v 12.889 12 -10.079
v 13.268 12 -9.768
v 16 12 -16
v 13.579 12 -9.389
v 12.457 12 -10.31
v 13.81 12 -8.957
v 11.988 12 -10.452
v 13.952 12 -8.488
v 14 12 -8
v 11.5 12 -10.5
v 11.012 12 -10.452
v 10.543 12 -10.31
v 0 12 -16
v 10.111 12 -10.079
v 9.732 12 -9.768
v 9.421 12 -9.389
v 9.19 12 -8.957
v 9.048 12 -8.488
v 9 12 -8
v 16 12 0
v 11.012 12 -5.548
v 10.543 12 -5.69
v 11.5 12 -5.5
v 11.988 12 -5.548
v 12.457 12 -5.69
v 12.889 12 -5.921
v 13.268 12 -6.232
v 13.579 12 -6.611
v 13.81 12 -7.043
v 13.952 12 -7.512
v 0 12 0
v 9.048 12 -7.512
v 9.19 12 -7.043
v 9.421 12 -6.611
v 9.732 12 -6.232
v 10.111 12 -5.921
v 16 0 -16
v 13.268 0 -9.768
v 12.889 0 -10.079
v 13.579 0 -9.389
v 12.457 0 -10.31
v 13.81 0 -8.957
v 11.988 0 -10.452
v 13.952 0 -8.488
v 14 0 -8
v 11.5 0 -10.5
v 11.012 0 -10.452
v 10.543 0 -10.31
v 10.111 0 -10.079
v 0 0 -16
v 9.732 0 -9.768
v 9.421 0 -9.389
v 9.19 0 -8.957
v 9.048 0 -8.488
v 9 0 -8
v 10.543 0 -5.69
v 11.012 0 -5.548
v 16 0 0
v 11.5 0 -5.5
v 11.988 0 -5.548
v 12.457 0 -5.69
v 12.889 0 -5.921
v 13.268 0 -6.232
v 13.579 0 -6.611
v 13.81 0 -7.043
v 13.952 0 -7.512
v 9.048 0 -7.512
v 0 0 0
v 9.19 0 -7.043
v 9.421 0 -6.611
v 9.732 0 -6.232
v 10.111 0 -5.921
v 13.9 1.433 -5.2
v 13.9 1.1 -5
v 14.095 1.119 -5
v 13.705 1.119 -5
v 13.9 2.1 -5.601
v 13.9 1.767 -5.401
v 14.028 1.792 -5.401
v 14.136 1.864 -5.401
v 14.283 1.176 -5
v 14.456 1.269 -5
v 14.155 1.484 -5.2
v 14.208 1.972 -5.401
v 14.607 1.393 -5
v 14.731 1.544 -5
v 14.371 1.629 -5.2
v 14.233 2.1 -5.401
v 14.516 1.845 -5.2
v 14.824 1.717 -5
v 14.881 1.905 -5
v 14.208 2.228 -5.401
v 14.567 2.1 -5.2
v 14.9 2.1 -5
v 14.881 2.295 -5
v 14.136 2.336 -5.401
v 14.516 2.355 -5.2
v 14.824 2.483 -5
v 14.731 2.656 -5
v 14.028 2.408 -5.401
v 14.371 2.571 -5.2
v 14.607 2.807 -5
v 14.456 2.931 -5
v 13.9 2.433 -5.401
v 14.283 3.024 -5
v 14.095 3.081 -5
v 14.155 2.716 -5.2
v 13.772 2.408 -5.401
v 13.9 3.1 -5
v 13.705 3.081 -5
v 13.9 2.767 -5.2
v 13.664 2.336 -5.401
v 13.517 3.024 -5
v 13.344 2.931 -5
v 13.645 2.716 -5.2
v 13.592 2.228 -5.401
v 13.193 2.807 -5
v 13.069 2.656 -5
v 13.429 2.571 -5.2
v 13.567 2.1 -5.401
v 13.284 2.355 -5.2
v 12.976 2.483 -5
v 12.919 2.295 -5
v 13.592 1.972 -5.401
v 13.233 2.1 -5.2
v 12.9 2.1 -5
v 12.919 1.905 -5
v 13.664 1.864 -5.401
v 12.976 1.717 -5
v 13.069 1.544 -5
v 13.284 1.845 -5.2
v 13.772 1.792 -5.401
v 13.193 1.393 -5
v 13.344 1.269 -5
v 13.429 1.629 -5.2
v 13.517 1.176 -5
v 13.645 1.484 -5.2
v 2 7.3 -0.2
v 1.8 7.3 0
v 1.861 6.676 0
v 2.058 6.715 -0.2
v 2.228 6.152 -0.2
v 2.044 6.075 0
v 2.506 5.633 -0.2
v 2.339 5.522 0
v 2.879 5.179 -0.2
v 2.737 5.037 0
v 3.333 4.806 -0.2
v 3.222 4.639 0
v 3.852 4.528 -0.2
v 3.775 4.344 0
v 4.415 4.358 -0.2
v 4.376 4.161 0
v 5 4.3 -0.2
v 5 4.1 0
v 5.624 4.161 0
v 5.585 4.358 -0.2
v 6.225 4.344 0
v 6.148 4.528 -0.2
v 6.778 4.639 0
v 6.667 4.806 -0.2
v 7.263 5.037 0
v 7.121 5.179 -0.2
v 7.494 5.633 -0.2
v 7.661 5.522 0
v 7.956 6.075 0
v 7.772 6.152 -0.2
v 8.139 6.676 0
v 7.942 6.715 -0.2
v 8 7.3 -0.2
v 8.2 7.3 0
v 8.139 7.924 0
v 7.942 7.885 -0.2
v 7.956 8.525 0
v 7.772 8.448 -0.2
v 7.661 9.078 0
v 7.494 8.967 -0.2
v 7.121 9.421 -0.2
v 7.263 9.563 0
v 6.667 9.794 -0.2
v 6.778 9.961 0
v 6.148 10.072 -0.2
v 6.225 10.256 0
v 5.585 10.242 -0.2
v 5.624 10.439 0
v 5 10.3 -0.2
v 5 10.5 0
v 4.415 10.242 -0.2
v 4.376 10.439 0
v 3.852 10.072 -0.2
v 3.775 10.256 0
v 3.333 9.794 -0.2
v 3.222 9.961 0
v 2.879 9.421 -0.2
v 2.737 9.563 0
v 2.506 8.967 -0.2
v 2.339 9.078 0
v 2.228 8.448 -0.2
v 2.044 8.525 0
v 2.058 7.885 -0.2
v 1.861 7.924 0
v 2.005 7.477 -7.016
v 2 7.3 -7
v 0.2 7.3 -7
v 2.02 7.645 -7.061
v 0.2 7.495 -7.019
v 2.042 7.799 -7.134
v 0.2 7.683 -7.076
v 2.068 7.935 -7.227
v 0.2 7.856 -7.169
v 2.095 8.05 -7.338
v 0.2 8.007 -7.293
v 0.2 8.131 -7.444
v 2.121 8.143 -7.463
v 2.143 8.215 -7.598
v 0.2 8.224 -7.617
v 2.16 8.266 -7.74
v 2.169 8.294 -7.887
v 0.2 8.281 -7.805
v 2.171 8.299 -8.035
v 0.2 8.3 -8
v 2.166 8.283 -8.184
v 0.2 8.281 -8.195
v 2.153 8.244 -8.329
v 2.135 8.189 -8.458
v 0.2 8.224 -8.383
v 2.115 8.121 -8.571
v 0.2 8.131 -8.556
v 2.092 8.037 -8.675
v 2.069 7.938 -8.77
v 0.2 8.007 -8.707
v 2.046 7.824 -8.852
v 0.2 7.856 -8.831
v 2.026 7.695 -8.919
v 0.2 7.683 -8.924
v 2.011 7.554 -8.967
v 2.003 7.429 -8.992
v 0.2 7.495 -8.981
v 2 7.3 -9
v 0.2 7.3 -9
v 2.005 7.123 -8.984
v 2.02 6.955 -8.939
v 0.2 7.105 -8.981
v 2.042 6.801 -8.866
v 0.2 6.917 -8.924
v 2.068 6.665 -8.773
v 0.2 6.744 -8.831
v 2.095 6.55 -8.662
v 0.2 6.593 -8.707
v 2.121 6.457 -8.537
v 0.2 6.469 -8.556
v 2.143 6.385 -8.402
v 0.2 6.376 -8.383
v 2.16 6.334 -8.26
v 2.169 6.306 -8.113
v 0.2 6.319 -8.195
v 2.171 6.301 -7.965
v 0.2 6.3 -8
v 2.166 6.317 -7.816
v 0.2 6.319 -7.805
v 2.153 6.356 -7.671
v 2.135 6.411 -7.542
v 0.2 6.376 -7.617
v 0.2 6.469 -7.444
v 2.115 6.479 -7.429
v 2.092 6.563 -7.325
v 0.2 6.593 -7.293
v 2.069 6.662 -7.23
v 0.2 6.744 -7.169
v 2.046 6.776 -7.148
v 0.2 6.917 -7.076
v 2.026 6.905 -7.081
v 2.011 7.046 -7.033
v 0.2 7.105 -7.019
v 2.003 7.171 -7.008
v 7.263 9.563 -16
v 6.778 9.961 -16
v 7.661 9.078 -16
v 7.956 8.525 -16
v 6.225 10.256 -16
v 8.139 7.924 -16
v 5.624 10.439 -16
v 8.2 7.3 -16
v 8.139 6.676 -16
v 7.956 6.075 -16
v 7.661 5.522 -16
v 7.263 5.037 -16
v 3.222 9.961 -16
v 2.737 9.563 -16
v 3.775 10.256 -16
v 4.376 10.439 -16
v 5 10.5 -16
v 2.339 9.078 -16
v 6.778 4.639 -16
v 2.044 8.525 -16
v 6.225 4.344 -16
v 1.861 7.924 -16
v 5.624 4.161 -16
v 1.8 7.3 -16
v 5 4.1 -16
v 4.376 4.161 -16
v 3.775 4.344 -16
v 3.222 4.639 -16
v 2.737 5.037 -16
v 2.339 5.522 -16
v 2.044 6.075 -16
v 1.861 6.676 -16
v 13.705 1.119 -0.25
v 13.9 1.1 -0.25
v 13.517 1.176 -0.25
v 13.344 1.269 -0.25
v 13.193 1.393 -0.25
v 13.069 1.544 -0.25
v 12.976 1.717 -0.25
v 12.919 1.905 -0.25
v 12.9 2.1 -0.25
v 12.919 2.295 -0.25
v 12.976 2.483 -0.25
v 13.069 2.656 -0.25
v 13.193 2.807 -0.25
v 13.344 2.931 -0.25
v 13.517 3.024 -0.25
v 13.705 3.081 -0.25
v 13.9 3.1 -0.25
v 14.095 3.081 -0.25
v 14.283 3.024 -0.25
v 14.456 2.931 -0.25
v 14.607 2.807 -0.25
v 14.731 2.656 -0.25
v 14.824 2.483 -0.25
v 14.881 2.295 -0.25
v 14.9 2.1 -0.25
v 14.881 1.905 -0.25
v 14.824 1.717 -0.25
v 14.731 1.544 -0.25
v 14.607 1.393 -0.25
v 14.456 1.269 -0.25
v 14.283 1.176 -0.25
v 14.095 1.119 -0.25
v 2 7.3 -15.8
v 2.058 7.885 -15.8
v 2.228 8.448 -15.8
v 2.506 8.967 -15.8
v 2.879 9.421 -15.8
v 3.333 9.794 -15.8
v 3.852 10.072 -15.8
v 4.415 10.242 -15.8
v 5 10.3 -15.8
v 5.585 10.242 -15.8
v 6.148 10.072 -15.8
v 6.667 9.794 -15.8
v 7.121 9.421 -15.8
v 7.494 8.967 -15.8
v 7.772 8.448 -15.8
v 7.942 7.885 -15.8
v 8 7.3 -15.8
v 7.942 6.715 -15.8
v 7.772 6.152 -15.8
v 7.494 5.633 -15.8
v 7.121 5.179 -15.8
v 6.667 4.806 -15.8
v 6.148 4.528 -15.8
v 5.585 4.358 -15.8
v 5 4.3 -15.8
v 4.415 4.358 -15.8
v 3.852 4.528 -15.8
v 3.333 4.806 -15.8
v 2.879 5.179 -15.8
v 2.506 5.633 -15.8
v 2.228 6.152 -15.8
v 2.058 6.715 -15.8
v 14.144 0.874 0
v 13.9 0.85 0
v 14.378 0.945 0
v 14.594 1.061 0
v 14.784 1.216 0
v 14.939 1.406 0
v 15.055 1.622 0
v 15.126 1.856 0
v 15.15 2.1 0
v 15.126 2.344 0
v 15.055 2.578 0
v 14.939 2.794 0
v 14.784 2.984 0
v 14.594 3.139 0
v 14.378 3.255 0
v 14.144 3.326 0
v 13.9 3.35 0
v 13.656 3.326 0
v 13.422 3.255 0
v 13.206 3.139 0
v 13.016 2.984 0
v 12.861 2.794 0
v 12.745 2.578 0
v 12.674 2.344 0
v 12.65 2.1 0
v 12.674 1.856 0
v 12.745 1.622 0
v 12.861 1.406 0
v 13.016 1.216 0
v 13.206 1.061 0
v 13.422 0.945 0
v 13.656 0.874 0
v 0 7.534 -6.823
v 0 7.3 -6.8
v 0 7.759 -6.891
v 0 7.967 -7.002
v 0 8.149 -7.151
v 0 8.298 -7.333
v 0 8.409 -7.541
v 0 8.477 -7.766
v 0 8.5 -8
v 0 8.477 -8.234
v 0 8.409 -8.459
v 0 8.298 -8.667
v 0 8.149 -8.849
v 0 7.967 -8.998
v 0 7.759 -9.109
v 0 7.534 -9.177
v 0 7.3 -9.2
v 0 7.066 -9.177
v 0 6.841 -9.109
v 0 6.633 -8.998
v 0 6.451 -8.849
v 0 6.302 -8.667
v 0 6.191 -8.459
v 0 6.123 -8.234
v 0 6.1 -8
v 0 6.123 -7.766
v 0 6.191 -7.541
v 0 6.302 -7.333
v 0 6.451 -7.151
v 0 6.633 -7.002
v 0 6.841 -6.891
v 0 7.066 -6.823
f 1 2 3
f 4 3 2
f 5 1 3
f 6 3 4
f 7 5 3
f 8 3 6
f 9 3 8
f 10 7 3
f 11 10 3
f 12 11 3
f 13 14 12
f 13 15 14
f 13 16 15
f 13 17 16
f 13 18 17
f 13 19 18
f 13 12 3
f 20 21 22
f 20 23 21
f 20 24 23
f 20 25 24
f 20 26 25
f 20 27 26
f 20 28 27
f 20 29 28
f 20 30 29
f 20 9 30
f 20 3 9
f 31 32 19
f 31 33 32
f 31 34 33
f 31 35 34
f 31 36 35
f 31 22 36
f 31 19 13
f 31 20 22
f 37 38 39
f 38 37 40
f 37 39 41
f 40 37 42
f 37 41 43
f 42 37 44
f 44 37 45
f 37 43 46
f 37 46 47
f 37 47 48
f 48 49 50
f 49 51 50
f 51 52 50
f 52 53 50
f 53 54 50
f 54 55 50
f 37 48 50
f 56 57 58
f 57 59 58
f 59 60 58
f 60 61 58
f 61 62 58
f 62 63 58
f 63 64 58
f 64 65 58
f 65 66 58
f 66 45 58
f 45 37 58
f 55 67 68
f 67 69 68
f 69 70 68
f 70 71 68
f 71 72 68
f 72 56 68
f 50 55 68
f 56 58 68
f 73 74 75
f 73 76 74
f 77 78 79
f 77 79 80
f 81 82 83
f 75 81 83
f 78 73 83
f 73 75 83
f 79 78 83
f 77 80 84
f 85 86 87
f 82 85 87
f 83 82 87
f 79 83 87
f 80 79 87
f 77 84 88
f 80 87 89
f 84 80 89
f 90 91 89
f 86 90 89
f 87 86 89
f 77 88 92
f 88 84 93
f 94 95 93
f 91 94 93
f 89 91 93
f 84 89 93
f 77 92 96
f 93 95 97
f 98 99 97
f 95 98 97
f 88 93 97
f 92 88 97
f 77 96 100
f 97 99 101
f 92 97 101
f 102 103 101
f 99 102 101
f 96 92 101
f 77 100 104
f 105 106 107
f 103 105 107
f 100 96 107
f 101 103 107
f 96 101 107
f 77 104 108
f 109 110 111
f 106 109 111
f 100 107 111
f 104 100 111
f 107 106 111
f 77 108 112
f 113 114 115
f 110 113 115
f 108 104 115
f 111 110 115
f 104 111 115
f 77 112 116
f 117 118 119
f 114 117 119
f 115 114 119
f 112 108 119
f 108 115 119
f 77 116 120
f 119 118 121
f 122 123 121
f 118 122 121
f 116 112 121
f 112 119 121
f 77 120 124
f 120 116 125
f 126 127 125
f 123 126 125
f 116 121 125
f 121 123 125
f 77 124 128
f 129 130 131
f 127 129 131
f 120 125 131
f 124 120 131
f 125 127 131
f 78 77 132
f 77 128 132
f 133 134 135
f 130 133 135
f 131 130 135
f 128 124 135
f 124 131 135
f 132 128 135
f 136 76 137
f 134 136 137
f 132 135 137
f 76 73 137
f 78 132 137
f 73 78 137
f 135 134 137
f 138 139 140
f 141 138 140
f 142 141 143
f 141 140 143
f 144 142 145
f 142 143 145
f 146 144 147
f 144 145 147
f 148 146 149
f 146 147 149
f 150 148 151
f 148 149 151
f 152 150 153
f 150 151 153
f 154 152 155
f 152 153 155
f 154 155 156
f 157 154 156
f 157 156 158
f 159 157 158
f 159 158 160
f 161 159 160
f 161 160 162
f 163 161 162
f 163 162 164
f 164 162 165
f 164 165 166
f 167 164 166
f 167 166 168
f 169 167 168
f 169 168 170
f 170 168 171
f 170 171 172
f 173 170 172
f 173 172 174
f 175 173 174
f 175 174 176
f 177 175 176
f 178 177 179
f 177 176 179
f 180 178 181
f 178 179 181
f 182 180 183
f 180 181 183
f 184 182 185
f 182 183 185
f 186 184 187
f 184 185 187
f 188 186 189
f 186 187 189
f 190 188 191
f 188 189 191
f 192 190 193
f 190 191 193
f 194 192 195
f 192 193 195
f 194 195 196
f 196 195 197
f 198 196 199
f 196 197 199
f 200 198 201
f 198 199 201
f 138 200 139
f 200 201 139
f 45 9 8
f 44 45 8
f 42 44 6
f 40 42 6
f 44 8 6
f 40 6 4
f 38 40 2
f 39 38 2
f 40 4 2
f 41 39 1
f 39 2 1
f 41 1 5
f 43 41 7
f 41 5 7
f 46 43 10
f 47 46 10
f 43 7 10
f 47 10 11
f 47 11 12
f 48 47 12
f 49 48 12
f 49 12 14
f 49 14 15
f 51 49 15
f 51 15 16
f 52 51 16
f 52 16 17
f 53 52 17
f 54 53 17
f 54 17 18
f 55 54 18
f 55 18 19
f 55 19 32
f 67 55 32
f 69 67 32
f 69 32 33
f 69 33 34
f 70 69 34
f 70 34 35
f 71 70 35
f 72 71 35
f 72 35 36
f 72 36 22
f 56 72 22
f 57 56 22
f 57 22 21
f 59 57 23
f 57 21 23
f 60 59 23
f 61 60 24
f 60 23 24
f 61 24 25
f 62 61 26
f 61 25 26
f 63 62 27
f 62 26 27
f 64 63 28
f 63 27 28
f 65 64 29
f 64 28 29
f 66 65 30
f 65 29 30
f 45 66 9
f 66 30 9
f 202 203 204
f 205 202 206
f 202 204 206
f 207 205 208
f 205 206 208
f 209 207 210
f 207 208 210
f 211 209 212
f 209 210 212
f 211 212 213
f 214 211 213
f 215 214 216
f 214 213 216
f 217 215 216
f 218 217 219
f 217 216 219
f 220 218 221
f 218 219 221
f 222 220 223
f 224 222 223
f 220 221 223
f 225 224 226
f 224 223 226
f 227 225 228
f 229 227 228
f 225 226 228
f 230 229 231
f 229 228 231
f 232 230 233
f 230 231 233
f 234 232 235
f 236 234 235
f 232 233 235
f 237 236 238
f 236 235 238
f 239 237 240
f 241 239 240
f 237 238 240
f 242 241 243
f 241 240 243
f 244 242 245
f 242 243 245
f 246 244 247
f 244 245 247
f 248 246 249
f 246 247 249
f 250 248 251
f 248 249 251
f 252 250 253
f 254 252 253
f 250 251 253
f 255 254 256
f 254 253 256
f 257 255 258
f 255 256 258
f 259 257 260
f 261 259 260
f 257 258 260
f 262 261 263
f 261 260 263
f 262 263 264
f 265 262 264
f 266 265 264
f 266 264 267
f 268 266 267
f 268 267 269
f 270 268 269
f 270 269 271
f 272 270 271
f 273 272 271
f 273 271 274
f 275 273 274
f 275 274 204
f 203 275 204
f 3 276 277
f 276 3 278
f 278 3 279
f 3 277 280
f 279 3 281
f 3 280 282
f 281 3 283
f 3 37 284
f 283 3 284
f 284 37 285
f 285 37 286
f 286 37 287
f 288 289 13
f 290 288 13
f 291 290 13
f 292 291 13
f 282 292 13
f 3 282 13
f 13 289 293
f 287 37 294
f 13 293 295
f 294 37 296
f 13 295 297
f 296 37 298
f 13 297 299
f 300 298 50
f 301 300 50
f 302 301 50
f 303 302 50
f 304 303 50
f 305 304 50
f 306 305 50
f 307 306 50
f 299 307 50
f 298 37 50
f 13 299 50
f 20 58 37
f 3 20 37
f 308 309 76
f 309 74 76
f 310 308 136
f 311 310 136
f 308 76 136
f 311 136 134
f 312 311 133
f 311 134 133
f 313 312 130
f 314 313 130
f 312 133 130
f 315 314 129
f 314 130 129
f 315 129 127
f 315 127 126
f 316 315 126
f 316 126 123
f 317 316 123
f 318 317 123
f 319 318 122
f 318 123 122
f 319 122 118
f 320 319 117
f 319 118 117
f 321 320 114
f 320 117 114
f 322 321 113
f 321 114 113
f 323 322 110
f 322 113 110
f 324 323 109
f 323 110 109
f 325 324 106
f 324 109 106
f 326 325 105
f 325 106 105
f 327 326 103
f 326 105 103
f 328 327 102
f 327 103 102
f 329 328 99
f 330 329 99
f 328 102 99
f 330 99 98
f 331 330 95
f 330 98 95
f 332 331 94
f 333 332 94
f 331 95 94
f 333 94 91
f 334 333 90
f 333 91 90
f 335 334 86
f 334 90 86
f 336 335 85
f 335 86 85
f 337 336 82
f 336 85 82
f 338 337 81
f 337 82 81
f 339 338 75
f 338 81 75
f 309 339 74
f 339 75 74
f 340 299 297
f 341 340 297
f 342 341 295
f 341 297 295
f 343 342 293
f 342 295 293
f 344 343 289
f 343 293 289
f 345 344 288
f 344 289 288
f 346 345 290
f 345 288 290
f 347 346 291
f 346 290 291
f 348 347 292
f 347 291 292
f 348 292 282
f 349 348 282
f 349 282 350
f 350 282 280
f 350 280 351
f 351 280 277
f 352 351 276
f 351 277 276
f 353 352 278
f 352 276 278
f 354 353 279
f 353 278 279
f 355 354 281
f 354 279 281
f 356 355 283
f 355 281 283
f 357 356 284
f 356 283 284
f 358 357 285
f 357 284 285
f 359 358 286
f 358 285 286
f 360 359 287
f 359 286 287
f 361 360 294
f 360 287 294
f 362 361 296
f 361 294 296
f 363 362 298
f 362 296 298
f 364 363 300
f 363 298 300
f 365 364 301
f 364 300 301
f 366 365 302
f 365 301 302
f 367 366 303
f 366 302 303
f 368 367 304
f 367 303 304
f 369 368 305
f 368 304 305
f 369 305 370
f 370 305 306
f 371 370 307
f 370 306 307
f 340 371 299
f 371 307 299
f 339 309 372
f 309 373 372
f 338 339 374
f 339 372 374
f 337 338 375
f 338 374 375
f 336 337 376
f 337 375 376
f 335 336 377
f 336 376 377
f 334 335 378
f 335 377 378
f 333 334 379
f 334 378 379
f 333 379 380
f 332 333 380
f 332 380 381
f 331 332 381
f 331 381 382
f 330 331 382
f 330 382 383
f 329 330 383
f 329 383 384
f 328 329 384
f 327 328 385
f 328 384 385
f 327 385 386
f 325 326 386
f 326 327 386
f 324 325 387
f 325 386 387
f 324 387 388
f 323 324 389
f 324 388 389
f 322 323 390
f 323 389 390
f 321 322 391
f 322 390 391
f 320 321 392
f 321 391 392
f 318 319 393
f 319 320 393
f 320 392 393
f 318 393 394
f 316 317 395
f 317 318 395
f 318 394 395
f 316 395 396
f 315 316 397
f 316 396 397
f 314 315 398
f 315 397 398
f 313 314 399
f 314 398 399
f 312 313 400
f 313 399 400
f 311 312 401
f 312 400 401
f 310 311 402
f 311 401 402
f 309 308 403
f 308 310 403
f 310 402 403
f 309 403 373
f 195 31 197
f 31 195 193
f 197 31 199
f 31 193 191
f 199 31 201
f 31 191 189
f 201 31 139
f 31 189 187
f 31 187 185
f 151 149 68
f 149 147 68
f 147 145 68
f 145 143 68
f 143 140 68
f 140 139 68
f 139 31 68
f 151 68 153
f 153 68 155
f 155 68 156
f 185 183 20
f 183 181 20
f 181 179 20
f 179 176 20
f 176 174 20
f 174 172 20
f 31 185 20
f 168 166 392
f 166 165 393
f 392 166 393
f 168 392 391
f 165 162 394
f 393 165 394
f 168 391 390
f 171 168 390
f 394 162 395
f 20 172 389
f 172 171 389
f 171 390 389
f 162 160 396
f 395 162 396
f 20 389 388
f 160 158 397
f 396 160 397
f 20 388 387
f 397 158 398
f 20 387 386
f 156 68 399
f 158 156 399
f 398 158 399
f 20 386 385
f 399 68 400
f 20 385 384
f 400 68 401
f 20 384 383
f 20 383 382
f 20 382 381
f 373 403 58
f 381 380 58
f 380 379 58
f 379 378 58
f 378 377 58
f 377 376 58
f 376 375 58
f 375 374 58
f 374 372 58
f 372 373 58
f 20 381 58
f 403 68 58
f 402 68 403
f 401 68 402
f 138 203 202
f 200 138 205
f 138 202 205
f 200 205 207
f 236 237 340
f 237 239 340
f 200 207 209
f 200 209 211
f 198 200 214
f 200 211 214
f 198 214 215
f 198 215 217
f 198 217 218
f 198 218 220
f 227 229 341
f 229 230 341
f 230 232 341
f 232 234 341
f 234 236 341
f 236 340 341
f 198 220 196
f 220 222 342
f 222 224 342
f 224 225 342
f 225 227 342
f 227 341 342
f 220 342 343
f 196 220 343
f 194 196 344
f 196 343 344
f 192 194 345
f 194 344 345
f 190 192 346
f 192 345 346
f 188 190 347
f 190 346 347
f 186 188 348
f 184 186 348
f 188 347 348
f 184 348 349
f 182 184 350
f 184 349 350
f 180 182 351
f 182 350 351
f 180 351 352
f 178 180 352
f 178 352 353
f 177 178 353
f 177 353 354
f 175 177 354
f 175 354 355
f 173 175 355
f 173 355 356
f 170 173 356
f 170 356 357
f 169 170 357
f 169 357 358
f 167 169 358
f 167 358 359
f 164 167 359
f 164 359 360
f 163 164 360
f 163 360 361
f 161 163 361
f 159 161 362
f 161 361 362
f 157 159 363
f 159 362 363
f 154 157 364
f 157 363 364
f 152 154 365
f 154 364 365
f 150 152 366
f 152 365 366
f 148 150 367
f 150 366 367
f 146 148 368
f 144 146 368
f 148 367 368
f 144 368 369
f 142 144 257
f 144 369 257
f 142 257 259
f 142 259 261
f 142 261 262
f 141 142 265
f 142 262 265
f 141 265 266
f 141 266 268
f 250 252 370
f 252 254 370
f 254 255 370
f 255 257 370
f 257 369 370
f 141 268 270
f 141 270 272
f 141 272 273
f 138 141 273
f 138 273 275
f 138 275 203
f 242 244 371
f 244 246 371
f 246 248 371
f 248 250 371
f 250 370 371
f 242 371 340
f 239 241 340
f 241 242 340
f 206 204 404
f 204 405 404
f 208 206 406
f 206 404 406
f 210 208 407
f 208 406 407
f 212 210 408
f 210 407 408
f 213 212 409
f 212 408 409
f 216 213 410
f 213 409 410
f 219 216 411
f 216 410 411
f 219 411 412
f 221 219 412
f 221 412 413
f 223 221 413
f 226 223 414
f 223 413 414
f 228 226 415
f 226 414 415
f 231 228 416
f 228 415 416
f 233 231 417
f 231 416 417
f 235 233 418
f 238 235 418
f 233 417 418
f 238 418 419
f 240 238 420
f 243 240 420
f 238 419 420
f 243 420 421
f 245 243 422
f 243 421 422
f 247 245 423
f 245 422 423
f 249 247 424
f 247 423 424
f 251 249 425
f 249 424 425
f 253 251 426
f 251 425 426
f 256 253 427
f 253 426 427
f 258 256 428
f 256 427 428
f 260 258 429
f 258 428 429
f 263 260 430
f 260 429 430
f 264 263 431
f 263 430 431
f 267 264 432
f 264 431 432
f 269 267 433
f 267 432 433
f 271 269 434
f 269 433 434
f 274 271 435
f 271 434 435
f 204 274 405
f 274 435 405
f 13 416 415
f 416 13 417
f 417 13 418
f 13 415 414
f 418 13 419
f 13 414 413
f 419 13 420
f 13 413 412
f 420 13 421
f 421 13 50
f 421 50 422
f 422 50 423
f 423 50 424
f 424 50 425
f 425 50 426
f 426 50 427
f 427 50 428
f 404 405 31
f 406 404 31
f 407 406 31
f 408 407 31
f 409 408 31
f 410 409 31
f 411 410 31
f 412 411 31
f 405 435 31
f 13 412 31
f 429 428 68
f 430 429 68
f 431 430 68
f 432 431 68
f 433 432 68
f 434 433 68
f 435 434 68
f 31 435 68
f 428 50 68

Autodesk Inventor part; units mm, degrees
ref_plane "YZ Plane" through (0, 0, 0) normal (1, 0, 0) x (0, 1, 0)
ref_plane "XZ Plane" through (0, 0, 0) normal (0, 1, 0) x (-1, 0, 0)
ref_plane "XY Plane" through (0, 0, 0) normal (0, 0, 1) x (1, 0, 0)
sketch "Sketch1" plane through (0, 0, 0) normal (0, 1, 0) x (-1, 0, 0)
  line L0 (0, 0) -> (-16, 0)
  line L1 (-16, 0) -> (-16, -16)
  line L2 (-16, -16) -> (0, -16)
  line L3 (0, -16) -> (0, 0)
  dimension "d0" = 16
extrude "Extrusion1" add sketch "Sketch1" along normal blind 12
sketch "Sketch2" plane through (16, 0, -16) normal (0, 0, -1) x (-1, 0, 0)
  line L0 (16, 0) -> (16, 12) projected
  line L1 (0, 12) -> (16, 12) projected
  circle A0 centre (11, 7.3) radius 3
  dimension "d3" = 6
  dimension "d4" = 5
  dimension "d5" = 4.7
extrude "Extrusion2" cut sketch "Sketch2" against normal through all
sketch "Sketch3" plane through (0, 0, 0) normal (0, 0, 1) x (1, 0, 0)
  line L0 (0, 0) -> (16, 0) projected
  line L1 (16, 0) -> (16, 12) projected
  point P0 (13.9, 2.1)
  dimension "d8" = 2.1
  dimension "d9" = 2.1
hole "Hole1" at (13.9, 2.1, 0) direction (0, 0, -1) diameter 2 depth 5 tip angle 118 countersink diameter 2.5 countersink angle 90
sketch "Sketch4" plane through (0, 12, 0) normal (0, 1, 0) x (1, 0, 0)
  line L0 (16, 0) -> (16, 16) projected
  line L1 (0, 16) -> (0, 0) projected
  circle A0 centre (11.5, 8) radius 2.5
  point P0 (0, 8)
  dimension "d17" = 5
  dimension "d18" = 4.5
extrude "Extrusion3" cut sketch "Sketch4" against normal through all
sketch "Sketch5" plane through (0, 0, -16) normal (-1, 0, 0) x (0, 0, 1)
  line L0 (0, 12) -> (16, 12) projected
  line L1 (0, 4.3) -> (0, 10.3) projected
  line L2 (16, 10.3) -> (16, 4.3) projected
  line L3 (0, 4.3) -> (0, 10.3) projected
  line L4 (0, 7.3) -> (16, 7.3) construction
  circle A0 centre (8, 7.3) radius 1
  dimension "d21" = 4.7
  dimension "d22" = 2
extrude "Extrusion4" cut sketch "Sketch5" against normal up to surface
thread "Thread1" size "M2x0.4" class "6H" standard "ANSI Metric M Profile" full length
chamfer "Chamfer1" distance 0.2 angle 45 1 edges at (0, 7.3, -9)
chamfer "Chamfer2" distance 0.2 angle 45 2 edges at (8, 7.3, 0) (8, 7.3, -16)
equation "\"d9\" = d8"
properties part number "heatblock" material "Aluminum 6061"
